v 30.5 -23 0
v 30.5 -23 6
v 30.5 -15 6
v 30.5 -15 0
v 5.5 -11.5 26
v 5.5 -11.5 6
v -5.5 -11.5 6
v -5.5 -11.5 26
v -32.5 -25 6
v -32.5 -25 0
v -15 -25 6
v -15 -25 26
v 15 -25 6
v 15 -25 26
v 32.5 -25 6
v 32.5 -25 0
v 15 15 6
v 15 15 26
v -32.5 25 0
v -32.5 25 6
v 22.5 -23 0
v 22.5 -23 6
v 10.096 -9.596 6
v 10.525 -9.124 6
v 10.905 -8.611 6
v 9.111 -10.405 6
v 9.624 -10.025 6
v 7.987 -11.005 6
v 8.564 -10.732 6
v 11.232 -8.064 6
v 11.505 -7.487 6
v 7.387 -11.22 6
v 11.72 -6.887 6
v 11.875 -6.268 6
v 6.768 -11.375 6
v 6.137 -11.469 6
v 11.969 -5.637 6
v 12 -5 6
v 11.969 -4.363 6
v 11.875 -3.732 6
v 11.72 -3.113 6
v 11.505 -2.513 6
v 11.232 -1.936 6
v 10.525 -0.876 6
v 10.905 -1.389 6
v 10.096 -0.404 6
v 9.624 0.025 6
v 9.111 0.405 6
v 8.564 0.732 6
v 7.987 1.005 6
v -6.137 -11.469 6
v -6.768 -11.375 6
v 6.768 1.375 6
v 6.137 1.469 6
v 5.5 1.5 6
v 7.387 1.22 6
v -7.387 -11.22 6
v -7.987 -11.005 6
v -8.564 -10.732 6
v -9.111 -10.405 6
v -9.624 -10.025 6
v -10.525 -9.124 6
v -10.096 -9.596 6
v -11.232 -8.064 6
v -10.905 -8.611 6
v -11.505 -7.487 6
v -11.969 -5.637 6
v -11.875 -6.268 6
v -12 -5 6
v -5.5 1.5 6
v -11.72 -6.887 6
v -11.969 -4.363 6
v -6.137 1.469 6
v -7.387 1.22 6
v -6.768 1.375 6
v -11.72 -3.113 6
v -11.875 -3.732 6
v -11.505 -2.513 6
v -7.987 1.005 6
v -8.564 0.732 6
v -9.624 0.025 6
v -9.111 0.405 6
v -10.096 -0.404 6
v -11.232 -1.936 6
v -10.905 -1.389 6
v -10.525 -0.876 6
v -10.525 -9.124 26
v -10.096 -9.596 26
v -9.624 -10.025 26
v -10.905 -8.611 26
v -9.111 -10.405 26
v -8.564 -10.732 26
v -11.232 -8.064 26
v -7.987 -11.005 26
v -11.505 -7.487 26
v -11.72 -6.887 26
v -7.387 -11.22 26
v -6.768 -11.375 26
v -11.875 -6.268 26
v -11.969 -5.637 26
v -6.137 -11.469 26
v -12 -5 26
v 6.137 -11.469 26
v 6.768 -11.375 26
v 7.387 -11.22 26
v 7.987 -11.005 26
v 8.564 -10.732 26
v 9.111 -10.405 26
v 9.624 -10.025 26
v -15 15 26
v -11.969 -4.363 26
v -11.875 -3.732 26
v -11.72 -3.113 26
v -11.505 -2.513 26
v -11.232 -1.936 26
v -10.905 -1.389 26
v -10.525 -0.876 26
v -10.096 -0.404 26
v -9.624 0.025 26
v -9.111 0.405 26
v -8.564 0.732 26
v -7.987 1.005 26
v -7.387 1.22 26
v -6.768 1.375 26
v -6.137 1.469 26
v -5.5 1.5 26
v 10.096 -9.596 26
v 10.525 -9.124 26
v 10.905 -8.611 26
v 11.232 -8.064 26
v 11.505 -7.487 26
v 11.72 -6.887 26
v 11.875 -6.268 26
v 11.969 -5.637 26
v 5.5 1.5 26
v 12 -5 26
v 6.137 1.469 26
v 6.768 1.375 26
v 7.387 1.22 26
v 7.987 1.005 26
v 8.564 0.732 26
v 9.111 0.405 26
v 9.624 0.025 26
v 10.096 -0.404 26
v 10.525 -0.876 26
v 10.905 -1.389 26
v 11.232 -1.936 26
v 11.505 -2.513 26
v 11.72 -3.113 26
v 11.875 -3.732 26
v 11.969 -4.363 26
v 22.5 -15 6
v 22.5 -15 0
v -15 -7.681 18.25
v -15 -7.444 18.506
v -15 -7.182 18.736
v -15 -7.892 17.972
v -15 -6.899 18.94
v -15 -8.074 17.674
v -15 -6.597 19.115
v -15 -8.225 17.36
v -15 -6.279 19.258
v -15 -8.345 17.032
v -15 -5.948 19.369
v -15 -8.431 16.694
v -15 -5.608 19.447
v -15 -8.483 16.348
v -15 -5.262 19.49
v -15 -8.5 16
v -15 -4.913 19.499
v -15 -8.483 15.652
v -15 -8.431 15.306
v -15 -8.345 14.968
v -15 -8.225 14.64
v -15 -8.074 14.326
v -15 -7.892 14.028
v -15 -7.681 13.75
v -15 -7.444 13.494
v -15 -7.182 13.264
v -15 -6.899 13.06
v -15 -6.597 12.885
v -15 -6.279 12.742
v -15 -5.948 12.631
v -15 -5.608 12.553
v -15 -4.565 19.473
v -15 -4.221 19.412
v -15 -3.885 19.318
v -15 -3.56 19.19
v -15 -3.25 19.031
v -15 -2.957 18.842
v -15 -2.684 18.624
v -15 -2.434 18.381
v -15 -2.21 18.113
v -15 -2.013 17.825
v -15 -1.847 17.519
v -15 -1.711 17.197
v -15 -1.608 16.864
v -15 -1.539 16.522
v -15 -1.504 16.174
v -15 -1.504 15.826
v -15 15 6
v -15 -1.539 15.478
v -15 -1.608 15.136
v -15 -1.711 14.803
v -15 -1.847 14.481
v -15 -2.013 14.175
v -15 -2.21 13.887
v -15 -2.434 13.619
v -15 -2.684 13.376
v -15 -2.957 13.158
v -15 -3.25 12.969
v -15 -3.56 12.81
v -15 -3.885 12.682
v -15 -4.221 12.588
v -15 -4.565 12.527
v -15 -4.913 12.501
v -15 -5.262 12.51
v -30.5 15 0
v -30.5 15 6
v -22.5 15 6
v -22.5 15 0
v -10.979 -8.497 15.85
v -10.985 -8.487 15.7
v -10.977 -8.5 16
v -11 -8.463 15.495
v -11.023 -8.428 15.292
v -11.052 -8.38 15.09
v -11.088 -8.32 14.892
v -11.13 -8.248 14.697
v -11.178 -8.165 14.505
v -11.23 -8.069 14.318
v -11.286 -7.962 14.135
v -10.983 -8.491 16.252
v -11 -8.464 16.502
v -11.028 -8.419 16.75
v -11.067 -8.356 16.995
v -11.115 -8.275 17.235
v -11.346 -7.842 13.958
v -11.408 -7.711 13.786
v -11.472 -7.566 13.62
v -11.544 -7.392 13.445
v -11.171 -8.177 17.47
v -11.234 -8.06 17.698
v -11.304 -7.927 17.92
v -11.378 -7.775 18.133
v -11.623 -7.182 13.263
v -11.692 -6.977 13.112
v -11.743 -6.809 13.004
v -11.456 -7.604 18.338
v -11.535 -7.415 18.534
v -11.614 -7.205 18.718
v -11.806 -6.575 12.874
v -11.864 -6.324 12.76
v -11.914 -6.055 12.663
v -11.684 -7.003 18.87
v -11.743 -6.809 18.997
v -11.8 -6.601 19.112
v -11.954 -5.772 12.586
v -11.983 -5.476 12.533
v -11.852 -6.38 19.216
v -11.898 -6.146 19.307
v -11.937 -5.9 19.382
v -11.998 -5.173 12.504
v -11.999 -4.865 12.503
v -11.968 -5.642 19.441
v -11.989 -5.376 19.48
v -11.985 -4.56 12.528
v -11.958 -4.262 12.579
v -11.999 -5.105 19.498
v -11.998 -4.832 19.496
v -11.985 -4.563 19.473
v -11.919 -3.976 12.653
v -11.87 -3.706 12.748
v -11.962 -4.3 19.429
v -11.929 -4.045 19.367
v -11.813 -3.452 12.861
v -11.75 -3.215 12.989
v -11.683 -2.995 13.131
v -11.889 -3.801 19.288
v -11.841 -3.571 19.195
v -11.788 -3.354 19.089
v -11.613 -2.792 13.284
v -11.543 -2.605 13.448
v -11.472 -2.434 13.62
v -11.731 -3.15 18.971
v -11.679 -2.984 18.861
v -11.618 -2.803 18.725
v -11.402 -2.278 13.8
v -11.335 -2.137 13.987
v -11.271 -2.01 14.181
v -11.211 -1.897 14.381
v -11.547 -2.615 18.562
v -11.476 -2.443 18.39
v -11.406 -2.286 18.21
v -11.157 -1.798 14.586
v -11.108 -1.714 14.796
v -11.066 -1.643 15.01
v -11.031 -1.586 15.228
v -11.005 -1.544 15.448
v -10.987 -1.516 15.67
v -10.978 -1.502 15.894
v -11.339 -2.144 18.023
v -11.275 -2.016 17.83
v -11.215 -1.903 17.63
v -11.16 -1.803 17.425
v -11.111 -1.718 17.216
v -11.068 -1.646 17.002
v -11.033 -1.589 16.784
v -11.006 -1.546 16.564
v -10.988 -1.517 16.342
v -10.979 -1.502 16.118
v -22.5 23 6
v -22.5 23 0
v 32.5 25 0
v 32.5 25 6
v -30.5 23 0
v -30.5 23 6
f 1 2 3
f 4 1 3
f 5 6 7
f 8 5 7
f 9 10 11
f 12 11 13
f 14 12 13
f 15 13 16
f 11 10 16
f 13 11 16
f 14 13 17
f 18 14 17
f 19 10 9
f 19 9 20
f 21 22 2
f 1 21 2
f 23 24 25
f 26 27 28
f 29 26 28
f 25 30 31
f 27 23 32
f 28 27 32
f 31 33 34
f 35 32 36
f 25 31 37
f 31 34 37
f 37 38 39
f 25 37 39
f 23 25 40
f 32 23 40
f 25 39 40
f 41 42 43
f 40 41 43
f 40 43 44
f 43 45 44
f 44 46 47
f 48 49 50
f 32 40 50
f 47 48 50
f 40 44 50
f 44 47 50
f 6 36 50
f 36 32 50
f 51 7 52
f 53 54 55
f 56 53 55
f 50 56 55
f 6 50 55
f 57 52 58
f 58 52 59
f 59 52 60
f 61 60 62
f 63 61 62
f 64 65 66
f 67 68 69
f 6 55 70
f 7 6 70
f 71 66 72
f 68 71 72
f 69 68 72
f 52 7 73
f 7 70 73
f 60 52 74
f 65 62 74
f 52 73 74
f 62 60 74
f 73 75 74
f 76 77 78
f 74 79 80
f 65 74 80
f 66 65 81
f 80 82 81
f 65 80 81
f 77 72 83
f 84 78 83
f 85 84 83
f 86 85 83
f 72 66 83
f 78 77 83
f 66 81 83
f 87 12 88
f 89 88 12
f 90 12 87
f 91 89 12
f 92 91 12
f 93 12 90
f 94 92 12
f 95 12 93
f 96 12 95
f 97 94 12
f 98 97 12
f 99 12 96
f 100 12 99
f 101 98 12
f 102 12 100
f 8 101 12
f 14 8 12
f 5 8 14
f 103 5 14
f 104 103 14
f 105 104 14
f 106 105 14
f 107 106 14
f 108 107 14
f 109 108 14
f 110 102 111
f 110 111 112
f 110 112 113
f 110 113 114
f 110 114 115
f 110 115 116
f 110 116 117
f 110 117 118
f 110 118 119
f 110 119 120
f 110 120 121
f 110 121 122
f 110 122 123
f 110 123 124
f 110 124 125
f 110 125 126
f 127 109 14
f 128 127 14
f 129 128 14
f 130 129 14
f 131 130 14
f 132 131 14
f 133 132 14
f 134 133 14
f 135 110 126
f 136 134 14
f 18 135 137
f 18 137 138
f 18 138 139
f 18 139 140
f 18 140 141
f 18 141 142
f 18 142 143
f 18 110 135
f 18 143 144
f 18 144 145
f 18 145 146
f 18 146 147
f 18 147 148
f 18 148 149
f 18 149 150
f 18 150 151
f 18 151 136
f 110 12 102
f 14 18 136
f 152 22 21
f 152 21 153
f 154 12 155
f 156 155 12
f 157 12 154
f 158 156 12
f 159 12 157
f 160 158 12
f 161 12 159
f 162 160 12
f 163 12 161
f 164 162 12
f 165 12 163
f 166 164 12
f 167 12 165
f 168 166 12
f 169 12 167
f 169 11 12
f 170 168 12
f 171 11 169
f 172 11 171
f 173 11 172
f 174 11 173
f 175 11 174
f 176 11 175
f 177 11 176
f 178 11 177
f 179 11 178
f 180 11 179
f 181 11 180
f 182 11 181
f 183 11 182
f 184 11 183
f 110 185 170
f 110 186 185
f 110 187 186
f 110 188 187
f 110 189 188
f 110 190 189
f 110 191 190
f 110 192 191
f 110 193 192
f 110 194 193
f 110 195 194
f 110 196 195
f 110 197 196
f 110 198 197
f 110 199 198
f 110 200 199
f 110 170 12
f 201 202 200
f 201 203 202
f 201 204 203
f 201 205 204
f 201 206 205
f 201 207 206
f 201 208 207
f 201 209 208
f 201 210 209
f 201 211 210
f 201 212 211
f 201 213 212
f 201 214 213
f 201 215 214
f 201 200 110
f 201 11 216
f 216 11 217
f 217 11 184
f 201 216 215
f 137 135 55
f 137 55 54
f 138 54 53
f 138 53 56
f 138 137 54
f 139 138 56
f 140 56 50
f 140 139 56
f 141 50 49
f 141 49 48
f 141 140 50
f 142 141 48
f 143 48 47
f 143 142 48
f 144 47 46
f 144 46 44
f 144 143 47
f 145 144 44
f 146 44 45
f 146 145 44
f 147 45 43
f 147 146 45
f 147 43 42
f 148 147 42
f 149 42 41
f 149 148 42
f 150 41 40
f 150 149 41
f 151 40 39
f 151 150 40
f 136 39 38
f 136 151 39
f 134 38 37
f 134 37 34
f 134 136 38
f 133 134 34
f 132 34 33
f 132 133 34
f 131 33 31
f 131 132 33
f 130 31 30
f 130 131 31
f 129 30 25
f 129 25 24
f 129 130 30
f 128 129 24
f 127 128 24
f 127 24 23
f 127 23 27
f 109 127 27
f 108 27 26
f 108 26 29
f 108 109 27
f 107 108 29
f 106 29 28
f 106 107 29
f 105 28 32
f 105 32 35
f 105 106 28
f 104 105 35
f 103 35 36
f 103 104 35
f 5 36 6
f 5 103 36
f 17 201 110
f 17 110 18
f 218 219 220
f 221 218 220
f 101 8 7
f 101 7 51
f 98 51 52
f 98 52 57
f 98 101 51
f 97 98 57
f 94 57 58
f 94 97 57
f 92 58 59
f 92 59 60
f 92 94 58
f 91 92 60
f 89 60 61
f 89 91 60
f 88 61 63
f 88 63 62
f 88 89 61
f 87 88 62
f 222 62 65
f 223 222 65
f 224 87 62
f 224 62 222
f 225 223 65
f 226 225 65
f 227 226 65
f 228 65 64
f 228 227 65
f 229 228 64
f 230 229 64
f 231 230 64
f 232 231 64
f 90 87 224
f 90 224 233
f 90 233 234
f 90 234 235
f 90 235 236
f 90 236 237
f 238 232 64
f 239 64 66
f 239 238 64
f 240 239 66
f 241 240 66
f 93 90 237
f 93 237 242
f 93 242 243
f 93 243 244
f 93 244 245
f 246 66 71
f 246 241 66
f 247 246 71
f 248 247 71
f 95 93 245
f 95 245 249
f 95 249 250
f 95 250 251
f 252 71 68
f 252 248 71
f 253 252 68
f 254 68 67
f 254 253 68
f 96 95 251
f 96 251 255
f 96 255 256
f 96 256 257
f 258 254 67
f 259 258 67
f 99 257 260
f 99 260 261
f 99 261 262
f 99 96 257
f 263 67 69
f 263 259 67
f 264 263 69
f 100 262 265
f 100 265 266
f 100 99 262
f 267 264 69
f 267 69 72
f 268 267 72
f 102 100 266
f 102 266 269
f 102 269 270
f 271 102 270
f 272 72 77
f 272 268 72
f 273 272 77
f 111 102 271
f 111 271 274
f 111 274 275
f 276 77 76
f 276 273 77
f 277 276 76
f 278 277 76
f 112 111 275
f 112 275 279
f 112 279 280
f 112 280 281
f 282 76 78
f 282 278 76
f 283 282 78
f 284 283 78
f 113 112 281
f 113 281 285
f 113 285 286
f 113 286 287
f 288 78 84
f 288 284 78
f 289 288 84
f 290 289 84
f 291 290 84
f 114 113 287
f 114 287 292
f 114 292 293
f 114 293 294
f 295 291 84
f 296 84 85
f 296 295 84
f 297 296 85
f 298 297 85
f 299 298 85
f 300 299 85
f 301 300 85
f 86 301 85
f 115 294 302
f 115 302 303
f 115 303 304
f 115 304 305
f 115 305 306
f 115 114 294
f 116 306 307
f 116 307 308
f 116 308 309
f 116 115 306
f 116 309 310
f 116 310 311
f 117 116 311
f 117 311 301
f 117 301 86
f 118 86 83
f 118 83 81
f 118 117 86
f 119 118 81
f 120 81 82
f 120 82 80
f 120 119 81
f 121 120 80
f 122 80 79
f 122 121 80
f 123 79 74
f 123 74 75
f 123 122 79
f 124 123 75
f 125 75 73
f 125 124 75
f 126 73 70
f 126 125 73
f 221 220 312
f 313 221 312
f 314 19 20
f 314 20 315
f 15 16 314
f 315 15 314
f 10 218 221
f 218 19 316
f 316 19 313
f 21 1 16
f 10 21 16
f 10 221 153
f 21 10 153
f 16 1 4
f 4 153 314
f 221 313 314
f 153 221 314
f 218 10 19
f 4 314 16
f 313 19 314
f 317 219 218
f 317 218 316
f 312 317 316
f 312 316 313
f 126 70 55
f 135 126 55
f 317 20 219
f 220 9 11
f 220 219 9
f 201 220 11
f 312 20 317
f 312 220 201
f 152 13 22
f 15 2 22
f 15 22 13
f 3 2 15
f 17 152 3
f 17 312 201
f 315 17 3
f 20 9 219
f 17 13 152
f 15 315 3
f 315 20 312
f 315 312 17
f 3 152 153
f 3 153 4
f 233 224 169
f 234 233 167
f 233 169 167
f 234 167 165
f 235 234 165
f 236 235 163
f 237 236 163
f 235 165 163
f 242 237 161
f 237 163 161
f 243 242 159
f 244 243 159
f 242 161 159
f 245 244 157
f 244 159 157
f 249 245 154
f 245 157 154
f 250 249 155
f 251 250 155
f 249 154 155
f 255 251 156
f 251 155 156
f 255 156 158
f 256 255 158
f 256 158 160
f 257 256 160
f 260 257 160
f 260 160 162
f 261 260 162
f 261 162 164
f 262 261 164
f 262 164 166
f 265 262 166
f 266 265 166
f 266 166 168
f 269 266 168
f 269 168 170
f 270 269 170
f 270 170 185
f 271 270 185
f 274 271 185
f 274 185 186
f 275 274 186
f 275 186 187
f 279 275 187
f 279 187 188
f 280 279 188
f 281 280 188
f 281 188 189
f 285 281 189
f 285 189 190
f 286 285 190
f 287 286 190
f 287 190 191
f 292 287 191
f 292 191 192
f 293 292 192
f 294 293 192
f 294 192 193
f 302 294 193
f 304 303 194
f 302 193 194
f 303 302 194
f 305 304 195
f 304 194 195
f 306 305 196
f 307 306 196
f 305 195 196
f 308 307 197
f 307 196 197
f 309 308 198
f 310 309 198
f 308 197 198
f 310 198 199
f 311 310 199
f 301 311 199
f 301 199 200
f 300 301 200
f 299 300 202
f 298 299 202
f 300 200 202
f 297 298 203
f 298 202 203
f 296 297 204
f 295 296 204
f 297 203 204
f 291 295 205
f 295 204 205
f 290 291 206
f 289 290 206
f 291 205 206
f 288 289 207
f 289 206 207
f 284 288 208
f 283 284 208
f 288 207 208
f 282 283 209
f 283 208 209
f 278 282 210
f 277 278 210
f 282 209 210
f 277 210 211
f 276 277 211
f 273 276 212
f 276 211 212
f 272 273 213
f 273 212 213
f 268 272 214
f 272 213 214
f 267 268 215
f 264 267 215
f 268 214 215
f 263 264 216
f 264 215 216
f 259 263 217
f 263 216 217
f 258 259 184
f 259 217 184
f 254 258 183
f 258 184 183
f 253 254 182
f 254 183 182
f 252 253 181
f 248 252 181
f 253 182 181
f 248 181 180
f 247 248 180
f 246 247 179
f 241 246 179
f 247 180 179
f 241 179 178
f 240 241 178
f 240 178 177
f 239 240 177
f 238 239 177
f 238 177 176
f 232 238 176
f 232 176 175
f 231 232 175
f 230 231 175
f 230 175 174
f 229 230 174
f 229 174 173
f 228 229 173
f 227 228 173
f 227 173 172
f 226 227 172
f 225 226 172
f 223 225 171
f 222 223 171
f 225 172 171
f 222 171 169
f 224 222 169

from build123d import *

# Parameters (mm, degrees)
SKETCH_1_W               = 65
SKETCH_1_H               = 50
EXTRUDE_1_DEPTH          = 6
SKETCH_2_W               = 8
SKETCH_2_H               = 8
CUT_EXTRUDE_1_DEPTH      = 42.43971525
SKETCH_3_W               = 30
SKETCH_3_H               = 40
EXTRUDE_2_DEPTH          = 20
CUT_EXTRUDE_2_DEPTH      = 20
CUT_EXTRUDE_3_REACH      = 61.643
CUT_EXTRUDE_3_END_RADIUS = 6.5
SKETCH_5_R               = 3.5


with BuildPart() as part:
    # Эскиз1 → Бобышка-Вытянуть1 (new body)
    with BuildSketch(Plane.XY):
        Rectangle(SKETCH_1_W, SKETCH_1_H)
    extrude(amount=EXTRUDE_1_DEPTH)

    # Эскиз2 → Вырез-Вытянуть1 (cut, through all)
    with BuildSketch(Plane.XY.offset(6)):
        with Locations((-26.5, 19)):
            Rectangle(SKETCH_2_W, SKETCH_2_H)
        with Locations((26.5, -19)):
            Rectangle(SKETCH_2_W, SKETCH_2_H)
    extrude(amount=-CUT_EXTRUDE_1_DEPTH, mode=Mode.SUBTRACT)

    # Эскиз3 → Бобышка-Вытянуть2 (add)
    with BuildSketch(Plane.XY.offset(6)):
        with Locations((0, -5)):
            Rectangle(SKETCH_3_W, SKETCH_3_H)
    extrude(amount=EXTRUDE_2_DEPTH)

    # Эскиз4 → Вырез-Вытянуть2 (cut)
    with BuildSketch(Plane.XY.offset(26)):
        with BuildLine():
            Line((-5.5, 1.5), (5.5, 1.5))
            ThreePointArc((5.5, 1.5), (12, -5), (5.5, -11.5))
            Line((5.5, -11.5), (-5.5, -11.5))
            ThreePointArc((-5.5, -11.5), (-12, -5), (-5.5, 1.5))
        make_face()
    extrude(amount=-CUT_EXTRUDE_2_DEPTH, mode=Mode.SUBTRACT)

    # Вырез-Вытянуть3: up to this cylinder (the profile starts outside it)
    cut_extrude_3_end = Plane(origin=(-5.5, -5, 16), z_dir=(0, 0, 1)) * Cylinder(CUT_EXTRUDE_3_END_RADIUS, 137.286, mode=Mode.PRIVATE)
    # Эскиз5 → Вырез-Вытянуть3 (cut, up to the surface)
    with BuildSketch(Plane.ZY.offset(15), mode=Mode.PRIVATE) as cut_extrude_3_sk1:
        with Locations(Location((16, -5, 0), (0, 0, 270))):
            Circle(SKETCH_5_R)
    cut_extrude_3_tool1 = extrude(cut_extrude_3_sk1.sketch, amount=-CUT_EXTRUDE_3_REACH, mode=Mode.PRIVATE) - cut_extrude_3_end
    add(cut_extrude_3_tool1.solids().sort_by_distance((-15, -5, 16))[0], mode=Mode.SUBTRACT)


solid = part.part
